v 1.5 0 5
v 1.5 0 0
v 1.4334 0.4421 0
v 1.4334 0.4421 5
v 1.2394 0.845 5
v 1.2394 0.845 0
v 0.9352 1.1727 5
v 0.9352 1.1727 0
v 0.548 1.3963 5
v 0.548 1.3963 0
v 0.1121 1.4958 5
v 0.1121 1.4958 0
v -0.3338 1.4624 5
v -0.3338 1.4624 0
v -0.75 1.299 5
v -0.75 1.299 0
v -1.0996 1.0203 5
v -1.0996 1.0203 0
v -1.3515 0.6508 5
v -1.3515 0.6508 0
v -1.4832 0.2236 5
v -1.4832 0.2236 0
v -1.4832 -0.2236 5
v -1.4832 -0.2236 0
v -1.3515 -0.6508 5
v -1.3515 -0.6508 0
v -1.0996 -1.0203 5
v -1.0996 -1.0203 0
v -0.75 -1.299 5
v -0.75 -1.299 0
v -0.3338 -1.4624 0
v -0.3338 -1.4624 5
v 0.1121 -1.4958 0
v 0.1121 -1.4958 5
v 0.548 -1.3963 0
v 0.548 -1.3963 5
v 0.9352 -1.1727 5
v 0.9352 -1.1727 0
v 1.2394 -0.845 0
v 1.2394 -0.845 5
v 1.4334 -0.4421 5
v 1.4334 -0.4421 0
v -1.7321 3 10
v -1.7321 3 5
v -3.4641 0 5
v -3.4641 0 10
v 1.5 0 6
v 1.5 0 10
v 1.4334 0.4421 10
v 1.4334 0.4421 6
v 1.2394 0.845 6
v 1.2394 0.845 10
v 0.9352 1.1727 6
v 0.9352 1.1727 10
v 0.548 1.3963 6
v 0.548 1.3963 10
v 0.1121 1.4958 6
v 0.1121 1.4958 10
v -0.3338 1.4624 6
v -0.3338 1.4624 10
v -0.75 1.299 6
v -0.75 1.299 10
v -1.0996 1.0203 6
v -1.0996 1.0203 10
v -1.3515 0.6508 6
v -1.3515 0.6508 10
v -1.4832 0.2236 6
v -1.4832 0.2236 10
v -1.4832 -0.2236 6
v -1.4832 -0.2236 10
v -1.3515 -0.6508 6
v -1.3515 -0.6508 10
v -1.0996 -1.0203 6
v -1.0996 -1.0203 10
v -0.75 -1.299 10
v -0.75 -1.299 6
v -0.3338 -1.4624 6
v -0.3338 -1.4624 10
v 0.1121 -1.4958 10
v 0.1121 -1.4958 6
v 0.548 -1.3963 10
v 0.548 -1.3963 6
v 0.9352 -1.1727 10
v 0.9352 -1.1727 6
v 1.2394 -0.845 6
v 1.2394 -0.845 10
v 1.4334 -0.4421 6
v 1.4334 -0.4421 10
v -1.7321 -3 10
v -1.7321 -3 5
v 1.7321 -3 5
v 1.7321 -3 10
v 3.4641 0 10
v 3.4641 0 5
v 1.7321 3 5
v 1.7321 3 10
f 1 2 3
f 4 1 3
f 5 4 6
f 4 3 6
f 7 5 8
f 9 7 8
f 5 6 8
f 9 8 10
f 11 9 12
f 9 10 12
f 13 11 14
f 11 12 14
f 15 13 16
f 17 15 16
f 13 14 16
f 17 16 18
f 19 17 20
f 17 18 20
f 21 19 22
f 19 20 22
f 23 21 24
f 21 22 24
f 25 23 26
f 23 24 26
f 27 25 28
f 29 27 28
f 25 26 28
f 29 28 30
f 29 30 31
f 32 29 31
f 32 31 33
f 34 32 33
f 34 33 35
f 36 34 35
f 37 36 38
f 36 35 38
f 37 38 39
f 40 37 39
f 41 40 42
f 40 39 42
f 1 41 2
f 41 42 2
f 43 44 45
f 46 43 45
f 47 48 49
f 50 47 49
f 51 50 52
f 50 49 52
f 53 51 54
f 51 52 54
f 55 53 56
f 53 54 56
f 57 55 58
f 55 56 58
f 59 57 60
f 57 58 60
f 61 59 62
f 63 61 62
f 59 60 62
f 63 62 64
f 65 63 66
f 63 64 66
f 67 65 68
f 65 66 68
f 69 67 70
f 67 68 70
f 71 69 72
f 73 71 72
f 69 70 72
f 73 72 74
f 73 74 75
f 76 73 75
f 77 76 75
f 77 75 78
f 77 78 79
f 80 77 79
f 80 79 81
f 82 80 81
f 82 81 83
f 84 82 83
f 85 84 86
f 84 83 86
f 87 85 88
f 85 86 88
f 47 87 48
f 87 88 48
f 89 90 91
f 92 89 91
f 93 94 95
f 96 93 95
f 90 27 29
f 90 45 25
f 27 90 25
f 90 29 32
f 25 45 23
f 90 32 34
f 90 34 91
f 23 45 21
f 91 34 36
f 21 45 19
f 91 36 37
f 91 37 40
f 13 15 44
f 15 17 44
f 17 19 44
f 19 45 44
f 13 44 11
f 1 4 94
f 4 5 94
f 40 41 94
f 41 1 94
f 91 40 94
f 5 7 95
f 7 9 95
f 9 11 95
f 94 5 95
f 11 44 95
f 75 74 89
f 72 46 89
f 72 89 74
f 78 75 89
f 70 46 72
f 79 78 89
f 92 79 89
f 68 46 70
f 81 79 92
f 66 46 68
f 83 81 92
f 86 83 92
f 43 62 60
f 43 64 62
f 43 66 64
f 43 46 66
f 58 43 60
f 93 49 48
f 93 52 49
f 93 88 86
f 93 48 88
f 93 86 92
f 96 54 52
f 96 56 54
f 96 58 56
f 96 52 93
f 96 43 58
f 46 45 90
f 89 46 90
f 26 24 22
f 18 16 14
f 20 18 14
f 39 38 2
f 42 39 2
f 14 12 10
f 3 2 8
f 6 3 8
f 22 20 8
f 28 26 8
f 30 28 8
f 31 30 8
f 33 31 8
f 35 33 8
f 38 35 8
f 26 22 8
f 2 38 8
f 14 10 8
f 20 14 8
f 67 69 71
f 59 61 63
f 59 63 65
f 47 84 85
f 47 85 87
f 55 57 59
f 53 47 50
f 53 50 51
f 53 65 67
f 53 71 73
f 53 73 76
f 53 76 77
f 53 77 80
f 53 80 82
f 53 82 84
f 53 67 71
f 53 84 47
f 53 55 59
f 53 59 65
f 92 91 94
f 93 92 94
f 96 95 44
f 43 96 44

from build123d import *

# Parameters (mm, degrees)
SKETCH_1_R          = 1.5
EXTRUDE_1_DEPTH     = 5
EXTRUDE_2_DEPTH     = 5
SKETCH_3_R          = 1.5
CUT_EXTRUDE_1_DEPTH = 4


with BuildPart() as part:
    # Эскиз1 → Бобышка-Вытянуть1 (new body)
    with BuildSketch(Plane.XY):
        Circle(SKETCH_1_R)
    extrude(amount=EXTRUDE_1_DEPTH)

    # Эскиз2 → Бобышка-Вытянуть2 (add)
    with BuildSketch(Plane.XY.offset(5)):
        Polygon((-3.464101615, 0), (-1.732050808, -3), (1.732050808, -3), (3.464101615, 0), (1.732050808, 3), (-1.732050808, 3), align=None)
    extrude(amount=EXTRUDE_2_DEPTH)

    # Эскиз3 → Вырез-Вытянуть1 (cut)
    with BuildSketch(Plane.XY.offset(10)):
        Circle(SKETCH_3_R)
    extrude(amount=-CUT_EXTRUDE_1_DEPTH, mode=Mode.SUBTRACT)


solid = part.part
